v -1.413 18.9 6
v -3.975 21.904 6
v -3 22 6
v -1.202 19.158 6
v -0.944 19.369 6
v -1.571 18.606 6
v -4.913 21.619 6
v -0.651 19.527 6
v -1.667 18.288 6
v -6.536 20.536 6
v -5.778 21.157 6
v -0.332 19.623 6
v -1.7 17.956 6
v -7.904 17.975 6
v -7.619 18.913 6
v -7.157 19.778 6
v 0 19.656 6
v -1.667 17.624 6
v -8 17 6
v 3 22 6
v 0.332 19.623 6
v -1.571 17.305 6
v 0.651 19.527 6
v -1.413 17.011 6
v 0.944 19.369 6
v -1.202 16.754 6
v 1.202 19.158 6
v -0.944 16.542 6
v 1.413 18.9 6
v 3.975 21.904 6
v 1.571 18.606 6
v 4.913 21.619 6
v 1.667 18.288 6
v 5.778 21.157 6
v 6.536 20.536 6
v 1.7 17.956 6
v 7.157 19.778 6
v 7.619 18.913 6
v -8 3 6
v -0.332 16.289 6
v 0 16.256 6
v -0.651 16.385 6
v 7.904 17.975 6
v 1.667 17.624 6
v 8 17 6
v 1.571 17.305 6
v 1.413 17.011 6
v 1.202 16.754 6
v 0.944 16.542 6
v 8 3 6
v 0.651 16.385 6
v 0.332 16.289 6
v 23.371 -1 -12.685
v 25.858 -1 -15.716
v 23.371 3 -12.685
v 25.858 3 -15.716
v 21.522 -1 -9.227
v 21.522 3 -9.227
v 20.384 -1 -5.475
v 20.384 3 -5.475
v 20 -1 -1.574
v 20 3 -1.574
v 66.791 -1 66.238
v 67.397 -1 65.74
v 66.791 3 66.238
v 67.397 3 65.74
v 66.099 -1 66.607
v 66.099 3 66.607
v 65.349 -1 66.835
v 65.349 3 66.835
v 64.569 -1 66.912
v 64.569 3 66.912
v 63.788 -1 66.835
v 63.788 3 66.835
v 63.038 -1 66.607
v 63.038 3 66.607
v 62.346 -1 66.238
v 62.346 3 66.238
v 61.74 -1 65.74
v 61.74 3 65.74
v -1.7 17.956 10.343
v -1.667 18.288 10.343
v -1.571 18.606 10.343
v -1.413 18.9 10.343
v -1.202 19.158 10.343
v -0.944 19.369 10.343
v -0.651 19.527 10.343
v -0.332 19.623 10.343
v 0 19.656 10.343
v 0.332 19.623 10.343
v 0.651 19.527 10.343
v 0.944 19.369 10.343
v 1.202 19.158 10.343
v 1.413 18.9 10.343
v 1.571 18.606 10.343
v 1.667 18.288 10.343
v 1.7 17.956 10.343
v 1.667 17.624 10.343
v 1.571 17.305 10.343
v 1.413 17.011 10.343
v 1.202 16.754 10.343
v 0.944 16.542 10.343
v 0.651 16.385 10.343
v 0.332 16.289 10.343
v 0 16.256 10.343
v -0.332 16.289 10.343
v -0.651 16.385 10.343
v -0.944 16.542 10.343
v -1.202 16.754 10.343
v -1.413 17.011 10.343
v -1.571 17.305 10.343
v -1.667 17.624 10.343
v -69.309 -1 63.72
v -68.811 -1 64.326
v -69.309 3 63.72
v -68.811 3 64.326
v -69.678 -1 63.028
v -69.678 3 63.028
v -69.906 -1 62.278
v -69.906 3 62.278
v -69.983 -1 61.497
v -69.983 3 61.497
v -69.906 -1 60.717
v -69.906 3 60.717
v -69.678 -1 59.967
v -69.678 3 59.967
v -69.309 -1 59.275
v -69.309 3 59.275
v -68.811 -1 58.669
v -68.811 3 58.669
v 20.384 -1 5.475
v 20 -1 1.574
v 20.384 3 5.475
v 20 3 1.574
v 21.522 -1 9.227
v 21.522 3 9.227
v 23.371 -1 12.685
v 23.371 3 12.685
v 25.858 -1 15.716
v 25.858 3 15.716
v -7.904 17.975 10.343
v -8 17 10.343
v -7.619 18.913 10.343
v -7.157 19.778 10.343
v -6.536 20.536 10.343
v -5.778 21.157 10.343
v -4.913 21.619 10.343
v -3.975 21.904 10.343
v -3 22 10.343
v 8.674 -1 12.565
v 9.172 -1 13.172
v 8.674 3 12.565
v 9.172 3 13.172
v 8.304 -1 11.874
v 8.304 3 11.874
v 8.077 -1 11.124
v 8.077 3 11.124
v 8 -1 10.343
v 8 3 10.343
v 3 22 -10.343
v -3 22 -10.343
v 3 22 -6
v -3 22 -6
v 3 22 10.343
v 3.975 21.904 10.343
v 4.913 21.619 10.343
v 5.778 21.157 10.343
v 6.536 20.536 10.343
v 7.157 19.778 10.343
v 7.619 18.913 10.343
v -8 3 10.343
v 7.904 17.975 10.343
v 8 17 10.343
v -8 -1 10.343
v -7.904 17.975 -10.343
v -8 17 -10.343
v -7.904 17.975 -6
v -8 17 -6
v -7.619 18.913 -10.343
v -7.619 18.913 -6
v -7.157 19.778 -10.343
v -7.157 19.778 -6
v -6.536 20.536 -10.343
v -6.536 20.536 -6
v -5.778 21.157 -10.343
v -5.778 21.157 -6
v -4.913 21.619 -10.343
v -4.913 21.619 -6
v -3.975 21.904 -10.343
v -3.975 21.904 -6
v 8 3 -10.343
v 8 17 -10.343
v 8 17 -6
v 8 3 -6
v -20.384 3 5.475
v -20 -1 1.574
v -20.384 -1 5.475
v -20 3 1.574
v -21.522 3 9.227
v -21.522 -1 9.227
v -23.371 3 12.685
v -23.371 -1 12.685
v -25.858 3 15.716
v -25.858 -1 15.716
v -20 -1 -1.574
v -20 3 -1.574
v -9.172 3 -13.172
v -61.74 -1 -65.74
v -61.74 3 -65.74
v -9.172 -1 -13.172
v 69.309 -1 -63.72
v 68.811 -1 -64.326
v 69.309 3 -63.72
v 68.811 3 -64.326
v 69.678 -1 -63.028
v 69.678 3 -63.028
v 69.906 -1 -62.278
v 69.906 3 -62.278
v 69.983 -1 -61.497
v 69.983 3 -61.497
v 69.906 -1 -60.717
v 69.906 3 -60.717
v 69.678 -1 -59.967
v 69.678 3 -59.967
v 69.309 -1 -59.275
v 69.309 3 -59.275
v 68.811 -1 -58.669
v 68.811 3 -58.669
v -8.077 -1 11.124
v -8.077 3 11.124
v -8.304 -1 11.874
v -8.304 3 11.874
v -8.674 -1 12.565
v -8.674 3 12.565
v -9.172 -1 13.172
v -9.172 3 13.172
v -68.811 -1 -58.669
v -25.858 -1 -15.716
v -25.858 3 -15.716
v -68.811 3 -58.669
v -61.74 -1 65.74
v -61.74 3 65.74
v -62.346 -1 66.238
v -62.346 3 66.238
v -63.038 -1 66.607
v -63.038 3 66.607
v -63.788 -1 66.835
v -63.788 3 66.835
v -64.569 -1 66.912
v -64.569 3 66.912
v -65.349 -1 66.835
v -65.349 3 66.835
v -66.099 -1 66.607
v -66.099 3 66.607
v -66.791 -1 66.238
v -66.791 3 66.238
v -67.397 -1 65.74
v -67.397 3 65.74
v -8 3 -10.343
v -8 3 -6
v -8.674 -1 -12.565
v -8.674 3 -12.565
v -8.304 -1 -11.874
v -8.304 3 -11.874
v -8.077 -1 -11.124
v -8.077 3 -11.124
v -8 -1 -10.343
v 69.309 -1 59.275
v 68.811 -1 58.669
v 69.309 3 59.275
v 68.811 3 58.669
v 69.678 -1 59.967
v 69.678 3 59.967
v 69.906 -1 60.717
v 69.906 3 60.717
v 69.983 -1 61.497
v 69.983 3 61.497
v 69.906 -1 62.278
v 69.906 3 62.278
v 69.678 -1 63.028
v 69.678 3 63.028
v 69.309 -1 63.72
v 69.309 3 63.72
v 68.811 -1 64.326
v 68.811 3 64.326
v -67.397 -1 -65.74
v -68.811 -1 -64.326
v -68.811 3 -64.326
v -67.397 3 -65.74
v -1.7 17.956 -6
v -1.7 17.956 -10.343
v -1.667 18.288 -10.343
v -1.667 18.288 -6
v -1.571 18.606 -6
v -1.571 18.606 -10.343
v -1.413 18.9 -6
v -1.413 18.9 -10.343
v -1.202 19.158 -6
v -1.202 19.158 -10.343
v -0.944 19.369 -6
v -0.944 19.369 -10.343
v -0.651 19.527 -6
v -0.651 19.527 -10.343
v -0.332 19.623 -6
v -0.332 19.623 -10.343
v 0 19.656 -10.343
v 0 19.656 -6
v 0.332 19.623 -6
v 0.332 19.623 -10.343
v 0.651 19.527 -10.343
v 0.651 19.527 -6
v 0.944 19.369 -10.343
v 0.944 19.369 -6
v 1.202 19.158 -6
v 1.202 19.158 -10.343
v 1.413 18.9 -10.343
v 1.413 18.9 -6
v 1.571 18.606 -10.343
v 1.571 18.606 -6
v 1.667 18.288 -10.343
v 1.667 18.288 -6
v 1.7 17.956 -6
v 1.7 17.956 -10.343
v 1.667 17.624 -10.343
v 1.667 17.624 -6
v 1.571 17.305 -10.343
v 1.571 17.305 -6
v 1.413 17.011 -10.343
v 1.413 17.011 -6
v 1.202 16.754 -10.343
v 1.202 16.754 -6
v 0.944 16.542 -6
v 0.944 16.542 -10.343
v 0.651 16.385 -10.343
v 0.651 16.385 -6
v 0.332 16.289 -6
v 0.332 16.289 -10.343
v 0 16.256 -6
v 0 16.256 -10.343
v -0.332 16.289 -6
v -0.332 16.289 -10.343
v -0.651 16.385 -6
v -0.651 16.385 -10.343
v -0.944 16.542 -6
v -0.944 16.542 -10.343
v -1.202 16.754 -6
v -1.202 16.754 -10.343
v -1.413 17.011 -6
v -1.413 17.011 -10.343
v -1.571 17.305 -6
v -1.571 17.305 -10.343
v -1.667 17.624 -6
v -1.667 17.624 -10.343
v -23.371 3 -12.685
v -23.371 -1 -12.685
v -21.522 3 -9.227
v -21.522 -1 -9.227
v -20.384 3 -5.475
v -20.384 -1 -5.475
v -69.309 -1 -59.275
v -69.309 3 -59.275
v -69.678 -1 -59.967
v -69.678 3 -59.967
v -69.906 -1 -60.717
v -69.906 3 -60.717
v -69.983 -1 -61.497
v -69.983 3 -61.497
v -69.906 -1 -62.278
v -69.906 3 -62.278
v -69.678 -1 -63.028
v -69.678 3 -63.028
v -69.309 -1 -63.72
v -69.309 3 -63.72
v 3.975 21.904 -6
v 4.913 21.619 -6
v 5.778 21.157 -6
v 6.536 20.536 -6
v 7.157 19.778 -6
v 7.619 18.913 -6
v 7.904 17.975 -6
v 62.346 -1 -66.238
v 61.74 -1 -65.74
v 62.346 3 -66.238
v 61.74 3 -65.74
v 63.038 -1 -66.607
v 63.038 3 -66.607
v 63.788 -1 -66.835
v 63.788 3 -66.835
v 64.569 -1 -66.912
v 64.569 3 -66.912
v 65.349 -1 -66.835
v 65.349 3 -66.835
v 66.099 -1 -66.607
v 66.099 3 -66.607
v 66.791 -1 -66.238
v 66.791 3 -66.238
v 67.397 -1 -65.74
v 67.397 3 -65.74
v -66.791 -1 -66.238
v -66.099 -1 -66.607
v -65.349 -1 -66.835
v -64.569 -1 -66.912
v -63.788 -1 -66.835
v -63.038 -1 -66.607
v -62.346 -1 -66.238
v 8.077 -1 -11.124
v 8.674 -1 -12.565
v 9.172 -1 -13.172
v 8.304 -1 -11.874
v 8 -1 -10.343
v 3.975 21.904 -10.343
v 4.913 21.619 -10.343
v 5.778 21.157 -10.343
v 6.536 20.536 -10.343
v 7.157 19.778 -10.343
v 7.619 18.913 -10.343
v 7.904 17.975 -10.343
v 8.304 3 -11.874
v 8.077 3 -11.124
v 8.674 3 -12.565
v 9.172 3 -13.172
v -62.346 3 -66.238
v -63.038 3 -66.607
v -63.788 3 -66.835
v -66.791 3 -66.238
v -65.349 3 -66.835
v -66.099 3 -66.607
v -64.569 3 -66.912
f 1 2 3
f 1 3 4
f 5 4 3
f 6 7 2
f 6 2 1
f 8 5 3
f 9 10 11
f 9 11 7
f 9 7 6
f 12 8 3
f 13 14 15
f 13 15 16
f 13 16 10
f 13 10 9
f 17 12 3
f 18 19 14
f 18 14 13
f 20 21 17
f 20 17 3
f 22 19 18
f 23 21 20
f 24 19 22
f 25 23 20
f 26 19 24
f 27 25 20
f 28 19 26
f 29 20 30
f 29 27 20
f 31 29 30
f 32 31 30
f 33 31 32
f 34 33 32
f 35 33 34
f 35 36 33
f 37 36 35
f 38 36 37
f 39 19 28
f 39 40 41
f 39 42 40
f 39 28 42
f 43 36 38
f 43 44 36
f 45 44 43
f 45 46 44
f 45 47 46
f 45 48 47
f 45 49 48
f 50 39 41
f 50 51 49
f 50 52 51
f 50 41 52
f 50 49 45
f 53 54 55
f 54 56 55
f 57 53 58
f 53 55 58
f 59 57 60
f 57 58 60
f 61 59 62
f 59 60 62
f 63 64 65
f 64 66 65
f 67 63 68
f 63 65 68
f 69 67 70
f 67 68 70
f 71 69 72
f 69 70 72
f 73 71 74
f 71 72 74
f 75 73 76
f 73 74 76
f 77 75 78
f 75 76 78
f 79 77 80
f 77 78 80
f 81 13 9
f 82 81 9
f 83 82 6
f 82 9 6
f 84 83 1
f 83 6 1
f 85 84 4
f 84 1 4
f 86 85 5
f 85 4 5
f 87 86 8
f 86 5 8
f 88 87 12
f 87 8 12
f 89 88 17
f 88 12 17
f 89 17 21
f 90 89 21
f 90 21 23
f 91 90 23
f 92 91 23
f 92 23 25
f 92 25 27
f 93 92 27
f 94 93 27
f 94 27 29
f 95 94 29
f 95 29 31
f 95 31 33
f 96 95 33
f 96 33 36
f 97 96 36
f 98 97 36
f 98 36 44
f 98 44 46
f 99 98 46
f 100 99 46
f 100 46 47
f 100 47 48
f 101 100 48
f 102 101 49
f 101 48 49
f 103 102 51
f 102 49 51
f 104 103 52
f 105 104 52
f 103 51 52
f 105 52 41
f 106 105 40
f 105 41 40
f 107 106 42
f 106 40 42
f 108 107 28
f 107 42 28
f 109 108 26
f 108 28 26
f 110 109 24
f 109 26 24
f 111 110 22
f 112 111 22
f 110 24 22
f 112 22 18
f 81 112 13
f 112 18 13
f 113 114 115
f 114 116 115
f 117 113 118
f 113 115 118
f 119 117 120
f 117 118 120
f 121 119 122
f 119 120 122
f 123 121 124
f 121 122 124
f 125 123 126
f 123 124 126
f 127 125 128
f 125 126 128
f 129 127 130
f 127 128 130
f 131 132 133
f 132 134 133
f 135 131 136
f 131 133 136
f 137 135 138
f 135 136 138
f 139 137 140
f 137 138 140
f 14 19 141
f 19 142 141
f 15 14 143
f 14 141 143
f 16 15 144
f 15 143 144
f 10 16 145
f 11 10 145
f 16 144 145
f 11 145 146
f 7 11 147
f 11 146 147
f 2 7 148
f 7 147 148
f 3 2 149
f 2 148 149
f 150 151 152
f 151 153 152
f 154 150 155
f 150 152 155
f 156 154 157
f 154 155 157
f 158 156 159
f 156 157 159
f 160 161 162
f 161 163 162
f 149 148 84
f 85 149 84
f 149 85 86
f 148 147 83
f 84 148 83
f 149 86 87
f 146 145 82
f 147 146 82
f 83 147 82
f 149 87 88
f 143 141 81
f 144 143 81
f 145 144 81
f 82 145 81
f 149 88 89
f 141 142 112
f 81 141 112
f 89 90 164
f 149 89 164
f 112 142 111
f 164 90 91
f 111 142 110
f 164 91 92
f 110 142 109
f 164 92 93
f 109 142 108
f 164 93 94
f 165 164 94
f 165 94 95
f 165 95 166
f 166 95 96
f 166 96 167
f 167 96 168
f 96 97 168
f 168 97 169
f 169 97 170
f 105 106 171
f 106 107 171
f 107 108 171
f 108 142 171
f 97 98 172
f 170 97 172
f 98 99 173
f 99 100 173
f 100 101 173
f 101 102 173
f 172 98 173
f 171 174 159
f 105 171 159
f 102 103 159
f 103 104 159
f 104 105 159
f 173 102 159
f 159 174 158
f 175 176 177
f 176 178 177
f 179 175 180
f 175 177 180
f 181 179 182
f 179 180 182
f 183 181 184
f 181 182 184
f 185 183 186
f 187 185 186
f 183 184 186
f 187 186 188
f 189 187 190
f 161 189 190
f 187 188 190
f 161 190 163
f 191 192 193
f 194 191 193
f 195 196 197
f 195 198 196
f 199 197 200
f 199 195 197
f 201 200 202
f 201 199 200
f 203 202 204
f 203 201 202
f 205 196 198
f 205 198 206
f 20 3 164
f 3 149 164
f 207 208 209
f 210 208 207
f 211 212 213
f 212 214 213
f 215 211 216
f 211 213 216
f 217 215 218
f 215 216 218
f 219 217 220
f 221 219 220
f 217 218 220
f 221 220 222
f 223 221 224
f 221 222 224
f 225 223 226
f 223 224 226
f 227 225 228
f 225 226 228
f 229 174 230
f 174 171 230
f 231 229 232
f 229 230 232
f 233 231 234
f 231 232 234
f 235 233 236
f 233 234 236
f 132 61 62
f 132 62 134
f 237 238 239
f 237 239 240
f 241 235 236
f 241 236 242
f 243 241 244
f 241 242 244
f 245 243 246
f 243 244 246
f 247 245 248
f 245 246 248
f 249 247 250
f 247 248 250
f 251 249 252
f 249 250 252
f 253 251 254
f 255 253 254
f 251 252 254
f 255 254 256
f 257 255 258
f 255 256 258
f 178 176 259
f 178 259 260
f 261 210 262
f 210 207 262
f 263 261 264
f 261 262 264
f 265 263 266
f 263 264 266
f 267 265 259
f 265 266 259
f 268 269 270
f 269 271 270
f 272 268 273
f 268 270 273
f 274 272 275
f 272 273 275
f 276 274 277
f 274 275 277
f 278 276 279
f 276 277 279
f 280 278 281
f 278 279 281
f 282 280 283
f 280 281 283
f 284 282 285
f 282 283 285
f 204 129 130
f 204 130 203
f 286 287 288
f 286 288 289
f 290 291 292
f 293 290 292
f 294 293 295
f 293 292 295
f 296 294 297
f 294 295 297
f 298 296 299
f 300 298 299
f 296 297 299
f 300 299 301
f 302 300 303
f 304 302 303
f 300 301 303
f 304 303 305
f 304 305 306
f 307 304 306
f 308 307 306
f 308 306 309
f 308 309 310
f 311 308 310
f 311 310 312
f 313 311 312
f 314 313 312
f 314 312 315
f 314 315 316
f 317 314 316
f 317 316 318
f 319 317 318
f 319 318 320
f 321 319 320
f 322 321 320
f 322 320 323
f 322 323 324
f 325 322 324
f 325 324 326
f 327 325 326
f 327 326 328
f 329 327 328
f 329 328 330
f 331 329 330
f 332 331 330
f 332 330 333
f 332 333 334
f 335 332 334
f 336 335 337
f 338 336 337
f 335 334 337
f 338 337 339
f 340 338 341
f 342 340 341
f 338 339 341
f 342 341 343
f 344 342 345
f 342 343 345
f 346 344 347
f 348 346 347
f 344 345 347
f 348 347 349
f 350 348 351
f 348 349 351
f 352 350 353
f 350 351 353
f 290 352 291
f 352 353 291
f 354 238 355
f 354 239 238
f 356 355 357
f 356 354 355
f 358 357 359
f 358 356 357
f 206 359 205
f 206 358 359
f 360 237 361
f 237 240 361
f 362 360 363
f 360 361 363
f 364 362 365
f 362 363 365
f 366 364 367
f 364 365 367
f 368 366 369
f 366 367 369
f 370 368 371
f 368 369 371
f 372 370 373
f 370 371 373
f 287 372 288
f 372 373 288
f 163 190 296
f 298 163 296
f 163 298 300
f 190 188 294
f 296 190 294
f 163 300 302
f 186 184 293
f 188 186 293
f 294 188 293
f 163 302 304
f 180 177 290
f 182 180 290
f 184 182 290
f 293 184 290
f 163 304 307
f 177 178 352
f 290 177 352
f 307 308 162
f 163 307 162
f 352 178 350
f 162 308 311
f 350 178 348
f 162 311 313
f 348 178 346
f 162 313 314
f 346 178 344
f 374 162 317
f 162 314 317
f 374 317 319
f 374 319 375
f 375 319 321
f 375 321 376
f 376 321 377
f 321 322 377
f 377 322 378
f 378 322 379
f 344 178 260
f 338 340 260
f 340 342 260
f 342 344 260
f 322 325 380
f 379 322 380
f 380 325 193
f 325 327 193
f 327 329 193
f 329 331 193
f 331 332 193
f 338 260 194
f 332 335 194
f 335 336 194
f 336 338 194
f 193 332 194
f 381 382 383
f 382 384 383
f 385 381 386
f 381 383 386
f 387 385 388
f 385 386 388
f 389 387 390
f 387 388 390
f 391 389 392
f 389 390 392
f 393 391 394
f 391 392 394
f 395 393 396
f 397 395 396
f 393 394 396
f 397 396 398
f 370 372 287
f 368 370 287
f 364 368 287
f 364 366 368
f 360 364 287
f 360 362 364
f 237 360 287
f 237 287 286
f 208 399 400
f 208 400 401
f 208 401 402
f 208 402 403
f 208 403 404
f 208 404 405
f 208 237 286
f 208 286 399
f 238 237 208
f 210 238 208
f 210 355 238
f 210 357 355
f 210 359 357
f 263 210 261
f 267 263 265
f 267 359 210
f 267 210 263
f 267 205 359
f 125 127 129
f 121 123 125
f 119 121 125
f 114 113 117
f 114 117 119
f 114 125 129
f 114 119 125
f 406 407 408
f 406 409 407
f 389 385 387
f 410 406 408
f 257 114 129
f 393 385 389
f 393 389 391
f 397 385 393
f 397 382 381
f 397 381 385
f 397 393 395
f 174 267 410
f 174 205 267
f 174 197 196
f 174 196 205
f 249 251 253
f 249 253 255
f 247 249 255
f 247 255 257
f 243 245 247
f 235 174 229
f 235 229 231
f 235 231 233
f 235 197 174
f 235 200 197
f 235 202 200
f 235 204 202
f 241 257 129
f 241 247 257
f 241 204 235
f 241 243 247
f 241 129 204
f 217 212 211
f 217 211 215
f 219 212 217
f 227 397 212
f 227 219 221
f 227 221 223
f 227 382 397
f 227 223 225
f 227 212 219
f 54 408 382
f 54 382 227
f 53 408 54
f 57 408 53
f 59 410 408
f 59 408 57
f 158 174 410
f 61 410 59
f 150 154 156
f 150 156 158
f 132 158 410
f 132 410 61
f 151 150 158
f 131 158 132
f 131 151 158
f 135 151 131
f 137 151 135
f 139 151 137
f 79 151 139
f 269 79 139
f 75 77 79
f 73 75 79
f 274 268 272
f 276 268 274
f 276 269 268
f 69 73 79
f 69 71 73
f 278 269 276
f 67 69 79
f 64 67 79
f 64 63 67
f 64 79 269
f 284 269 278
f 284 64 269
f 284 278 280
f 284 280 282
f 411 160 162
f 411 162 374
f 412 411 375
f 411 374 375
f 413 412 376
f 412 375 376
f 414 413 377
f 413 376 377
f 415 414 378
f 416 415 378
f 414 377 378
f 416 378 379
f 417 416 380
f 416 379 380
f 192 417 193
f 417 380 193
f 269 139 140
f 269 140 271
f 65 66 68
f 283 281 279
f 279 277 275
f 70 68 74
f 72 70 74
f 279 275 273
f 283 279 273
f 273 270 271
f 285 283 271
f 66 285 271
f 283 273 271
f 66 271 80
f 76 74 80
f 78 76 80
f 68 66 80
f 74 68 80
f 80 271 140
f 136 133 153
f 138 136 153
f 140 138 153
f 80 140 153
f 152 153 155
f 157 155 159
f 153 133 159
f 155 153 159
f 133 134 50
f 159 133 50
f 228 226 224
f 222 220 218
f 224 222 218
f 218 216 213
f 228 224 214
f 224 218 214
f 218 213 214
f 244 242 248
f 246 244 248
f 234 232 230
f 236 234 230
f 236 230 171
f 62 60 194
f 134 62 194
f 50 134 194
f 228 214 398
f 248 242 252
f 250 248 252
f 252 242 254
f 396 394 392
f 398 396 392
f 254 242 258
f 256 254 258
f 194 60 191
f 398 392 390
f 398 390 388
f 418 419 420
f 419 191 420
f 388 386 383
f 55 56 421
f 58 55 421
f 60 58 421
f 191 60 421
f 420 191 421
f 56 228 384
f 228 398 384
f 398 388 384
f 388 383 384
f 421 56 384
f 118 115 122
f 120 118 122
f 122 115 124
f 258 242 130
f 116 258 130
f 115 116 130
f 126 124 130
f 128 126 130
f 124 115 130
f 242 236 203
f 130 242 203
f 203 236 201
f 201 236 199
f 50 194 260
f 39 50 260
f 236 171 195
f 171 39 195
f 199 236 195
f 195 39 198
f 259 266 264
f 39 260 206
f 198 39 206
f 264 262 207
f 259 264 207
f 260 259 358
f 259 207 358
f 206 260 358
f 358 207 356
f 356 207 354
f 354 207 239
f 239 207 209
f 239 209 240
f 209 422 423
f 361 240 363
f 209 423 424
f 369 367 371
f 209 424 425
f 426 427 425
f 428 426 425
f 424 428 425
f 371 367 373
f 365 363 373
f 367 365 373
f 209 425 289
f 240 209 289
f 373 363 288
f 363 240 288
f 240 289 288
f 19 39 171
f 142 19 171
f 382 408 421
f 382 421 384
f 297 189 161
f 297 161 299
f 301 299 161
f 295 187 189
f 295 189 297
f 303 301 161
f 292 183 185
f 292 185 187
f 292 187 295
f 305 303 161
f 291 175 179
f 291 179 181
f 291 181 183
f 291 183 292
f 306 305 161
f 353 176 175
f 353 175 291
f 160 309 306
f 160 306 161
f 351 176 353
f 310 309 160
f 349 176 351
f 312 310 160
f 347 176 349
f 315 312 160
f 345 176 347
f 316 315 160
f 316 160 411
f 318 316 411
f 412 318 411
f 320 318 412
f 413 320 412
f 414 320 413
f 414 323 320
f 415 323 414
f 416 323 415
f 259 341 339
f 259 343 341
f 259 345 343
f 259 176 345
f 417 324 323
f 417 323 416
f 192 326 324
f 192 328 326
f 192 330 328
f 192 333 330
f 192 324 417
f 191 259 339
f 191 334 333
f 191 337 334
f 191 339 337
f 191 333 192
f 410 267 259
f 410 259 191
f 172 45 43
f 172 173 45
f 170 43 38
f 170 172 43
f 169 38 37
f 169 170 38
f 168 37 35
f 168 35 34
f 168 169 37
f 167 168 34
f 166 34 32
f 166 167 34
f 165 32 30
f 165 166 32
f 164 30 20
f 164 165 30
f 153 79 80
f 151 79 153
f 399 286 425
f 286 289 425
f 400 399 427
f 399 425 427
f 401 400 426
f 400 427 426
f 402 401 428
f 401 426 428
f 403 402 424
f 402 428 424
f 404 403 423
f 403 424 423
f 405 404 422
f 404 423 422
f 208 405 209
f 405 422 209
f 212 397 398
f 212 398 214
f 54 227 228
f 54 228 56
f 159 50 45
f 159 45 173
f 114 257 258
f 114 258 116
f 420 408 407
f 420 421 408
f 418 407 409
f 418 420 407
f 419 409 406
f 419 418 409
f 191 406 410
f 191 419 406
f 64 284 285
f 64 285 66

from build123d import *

# Parameters (mm, degrees)
BOSS_EXTRUDE2_DEPTH     = 2
FILLET1_R               = 2
FILLET2_R               = 10
ECHELLE1_SCALE          = 2
ESQUISSE1_W             = 16
ESQUISSE1_H             = 4.343145751
BOSS_EXTRU_1_DEPTH      = 23
ENL_V_MAT_EXTRU_1_REACH = 108.536
ESQUISSE2_R             = 1.7
CONG_1_R                = 5


with BuildPart() as part:
    # Sketch2 → Boss-Extrude2 (new body)
    with BuildSketch(Plane(origin=(0, 0, 0), x_dir=(1, 0, 0), z_dir=(0, 1, 0))):
        Polygon((4, 6), (32.284271247, 34.284271247), (35.819805153, 30.748737342), (10, 4.928932188), (10, -4.928932188), (35.819805153, -30.748737342), (32.284271247, -34.284271247), (4, -6), (4, -3), (-4, -3), (-4, -6), (-32.284271247, -34.284271247), (-35.819805153, -30.748737342), (-10, -4.928932188), (-10, 4.928932188), (-35.819805153, 30.748737342), (-32.284271247, 34.284271247), (-4, 6), (-4, 3), (4, 3), align=None)
    extrude(amount=BOSS_EXTRUDE2_DEPTH)

    # Fillet1
    fillet1_edges = [part.edges().sort_by_distance(p)[0] for p in [
        (4, 1, -6),
        (32.284271247, 1, -34.284271247),
        (35.819805153, 1, -30.748737342),
        (35.819805153, 1, 30.748737342),
        (32.284271247, 1, 34.284271247),
        (4, 1, 6),
        (-4, 1, 6),
        (-32.284271247, 1, 34.284271247),
        (-35.819805153, 1, 30.748737342),
        (-35.819805153, 1, -30.748737342),
        (-32.284271247, 1, -34.284271247),
        (-4, 1, -6),
    ]]
    fillet(fillet1_edges, radius=FILLET1_R)

    # Fillet2
    fillet2_edges = [part.edges().sort_by_distance(p)[0] for p in [
        (10, 1, -4.928932188),
        (10, 1, 4.928932188),
        (-10, 1, 4.928932188),
        (-10, 1, -4.928932188),
    ]]
    fillet(fillet2_edges, radius=FILLET2_R)


with BuildPart() as part_1:
    # Echelle1: scaled about (0, 1, 0)
    add(part.part.scale(ECHELLE1_SCALE).moved(Location((0, -1, 0))))

    # Esquisse1 → Boss.-Extru.1 (add)
    with BuildSketch(Plane.XZ.offset(1)):
        with Locations((0, -8.171572876)):
            Rectangle(ESQUISSE1_W, ESQUISSE1_H)
        with Locations((0, 8.171572876)):
            Rectangle(ESQUISSE1_W, ESQUISSE1_H)
    extrude(amount=-BOSS_EXTRU_1_DEPTH)

    # Enlèv. mat.-Extru.1: up to this face of the body (flat: up to its plane)
    enl_v_mat_extru_1_end = Plane(part_1.part.faces().sort_by_distance((0, 10.5, 10.343145751))[0])
    # Esquisse2 → Enlèv. mat.-Extru.1 (cut, up to the picked face)
    with BuildSketch(Plane(origin=(0, 0, -10.343145751), x_dir=(-1, 0, 0), z_dir=(0, 0, -1)), mode=Mode.PRIVATE) as enl_v_mat_extru_1_sk1:
        with Locations((0, 17.955923501)):
            Circle(ESQUISSE2_R)
    enl_v_mat_extru_1_tool1 = split(extrude(enl_v_mat_extru_1_sk1.sketch, amount=-ENL_V_MAT_EXTRU_1_REACH, mode=Mode.PRIVATE), bisect_by=enl_v_mat_extru_1_end, keep=Keep.BOTH, mode=Mode.PRIVATE)
    add(enl_v_mat_extru_1_tool1.solids().sort_by(Axis((0, 17.955924, -10.343146), (0, 0, 1)))[0], mode=Mode.SUBTRACT)

    # Congé1
    cong_1_edges = [part_1.edges().sort_by_distance(p)[0] for p in [
        (8, 22, -8.171572875),
        (-8, 22, -8.171572875),
        (8, 22, 8.171572875),
        (-8, 22, 8.171572875),
    ]]
    fillet(cong_1_edges, radius=CONG_1_R)


solid = part_1.part
